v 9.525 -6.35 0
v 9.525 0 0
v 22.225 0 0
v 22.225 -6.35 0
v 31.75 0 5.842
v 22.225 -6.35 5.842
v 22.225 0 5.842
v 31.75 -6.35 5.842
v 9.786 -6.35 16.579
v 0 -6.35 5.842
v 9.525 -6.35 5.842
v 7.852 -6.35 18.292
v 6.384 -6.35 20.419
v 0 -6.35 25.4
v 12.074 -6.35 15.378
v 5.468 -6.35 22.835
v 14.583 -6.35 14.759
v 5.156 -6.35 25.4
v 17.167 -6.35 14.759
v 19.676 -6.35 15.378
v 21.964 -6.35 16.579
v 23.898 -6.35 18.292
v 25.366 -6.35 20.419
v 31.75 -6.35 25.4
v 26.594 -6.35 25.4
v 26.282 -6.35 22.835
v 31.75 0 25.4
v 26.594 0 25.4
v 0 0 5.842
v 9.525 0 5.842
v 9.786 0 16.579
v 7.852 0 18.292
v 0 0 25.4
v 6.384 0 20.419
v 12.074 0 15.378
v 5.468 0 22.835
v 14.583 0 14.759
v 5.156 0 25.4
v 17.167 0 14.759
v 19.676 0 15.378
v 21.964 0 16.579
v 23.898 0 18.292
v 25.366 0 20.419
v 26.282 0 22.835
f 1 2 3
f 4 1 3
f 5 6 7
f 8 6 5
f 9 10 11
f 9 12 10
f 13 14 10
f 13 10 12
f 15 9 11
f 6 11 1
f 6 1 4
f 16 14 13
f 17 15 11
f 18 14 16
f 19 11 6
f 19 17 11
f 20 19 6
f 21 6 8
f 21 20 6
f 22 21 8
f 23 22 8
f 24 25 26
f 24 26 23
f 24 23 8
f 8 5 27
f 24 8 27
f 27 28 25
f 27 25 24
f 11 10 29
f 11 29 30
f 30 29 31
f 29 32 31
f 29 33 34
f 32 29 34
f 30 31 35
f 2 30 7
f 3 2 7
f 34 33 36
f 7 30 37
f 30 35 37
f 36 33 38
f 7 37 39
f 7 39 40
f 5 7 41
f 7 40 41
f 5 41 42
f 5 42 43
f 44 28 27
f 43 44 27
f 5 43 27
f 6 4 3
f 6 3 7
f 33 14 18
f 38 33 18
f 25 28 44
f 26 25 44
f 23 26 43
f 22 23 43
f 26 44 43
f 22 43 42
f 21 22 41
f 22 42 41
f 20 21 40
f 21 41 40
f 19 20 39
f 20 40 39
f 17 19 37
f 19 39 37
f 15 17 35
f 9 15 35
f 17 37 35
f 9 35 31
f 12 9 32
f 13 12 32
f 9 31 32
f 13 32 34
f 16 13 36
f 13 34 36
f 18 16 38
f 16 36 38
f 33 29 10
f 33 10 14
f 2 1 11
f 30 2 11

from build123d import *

# Parameters (mm, degrees)
F0_W     = 31.75
F0_H     = 25.4
F1_DEPTH = 6.35
F3_DEPTH = 6.35
F4_W     = 9.525
F4_H     = 6.854803
F5_DEPTH = 6.351


with BuildPart() as f1:
    # F0 (on Front) → F1 (new body)
    with BuildSketch(Plane.XZ):
        with Locations((15.875, 12.7)):
            Rectangle(F0_W, F0_H)
    extrude(amount=F1_DEPTH)

    # F2 (on face) → F3 (cut)
    with BuildSketch(Plane(origin=(0, 0, 0), x_dir=(-1, 0, 0), z_dir=(0, 1, 0))):
        with BuildLine():
            Line((-26.5938, 28.933519), (-26.5938, 25.4))
            ThreePointArc((-26.5938, 25.4), (-15.875, 14.6812), (-5.1562, 25.4))
            Line((-5.1562, 25.4), (-5.135716, 28.933519))
            Line((-5.135716, 28.933519), (-26.5938, 28.933519))
        make_face()
    extrude(amount=-F3_DEPTH, mode=Mode.SUBTRACT)

    # F4 (on face) → F5 (cut, through all)
    with BuildSketch(Plane.XZ.offset(6.35)):
        with Locations((4.7625, 2.414598)):
            Rectangle(F4_W, F4_H)
        with Locations((26.9875, 2.414598)):
            Rectangle(F4_W, F4_H)
    extrude(amount=-F5_DEPTH, mode=Mode.SUBTRACT)


solid = f1.part
